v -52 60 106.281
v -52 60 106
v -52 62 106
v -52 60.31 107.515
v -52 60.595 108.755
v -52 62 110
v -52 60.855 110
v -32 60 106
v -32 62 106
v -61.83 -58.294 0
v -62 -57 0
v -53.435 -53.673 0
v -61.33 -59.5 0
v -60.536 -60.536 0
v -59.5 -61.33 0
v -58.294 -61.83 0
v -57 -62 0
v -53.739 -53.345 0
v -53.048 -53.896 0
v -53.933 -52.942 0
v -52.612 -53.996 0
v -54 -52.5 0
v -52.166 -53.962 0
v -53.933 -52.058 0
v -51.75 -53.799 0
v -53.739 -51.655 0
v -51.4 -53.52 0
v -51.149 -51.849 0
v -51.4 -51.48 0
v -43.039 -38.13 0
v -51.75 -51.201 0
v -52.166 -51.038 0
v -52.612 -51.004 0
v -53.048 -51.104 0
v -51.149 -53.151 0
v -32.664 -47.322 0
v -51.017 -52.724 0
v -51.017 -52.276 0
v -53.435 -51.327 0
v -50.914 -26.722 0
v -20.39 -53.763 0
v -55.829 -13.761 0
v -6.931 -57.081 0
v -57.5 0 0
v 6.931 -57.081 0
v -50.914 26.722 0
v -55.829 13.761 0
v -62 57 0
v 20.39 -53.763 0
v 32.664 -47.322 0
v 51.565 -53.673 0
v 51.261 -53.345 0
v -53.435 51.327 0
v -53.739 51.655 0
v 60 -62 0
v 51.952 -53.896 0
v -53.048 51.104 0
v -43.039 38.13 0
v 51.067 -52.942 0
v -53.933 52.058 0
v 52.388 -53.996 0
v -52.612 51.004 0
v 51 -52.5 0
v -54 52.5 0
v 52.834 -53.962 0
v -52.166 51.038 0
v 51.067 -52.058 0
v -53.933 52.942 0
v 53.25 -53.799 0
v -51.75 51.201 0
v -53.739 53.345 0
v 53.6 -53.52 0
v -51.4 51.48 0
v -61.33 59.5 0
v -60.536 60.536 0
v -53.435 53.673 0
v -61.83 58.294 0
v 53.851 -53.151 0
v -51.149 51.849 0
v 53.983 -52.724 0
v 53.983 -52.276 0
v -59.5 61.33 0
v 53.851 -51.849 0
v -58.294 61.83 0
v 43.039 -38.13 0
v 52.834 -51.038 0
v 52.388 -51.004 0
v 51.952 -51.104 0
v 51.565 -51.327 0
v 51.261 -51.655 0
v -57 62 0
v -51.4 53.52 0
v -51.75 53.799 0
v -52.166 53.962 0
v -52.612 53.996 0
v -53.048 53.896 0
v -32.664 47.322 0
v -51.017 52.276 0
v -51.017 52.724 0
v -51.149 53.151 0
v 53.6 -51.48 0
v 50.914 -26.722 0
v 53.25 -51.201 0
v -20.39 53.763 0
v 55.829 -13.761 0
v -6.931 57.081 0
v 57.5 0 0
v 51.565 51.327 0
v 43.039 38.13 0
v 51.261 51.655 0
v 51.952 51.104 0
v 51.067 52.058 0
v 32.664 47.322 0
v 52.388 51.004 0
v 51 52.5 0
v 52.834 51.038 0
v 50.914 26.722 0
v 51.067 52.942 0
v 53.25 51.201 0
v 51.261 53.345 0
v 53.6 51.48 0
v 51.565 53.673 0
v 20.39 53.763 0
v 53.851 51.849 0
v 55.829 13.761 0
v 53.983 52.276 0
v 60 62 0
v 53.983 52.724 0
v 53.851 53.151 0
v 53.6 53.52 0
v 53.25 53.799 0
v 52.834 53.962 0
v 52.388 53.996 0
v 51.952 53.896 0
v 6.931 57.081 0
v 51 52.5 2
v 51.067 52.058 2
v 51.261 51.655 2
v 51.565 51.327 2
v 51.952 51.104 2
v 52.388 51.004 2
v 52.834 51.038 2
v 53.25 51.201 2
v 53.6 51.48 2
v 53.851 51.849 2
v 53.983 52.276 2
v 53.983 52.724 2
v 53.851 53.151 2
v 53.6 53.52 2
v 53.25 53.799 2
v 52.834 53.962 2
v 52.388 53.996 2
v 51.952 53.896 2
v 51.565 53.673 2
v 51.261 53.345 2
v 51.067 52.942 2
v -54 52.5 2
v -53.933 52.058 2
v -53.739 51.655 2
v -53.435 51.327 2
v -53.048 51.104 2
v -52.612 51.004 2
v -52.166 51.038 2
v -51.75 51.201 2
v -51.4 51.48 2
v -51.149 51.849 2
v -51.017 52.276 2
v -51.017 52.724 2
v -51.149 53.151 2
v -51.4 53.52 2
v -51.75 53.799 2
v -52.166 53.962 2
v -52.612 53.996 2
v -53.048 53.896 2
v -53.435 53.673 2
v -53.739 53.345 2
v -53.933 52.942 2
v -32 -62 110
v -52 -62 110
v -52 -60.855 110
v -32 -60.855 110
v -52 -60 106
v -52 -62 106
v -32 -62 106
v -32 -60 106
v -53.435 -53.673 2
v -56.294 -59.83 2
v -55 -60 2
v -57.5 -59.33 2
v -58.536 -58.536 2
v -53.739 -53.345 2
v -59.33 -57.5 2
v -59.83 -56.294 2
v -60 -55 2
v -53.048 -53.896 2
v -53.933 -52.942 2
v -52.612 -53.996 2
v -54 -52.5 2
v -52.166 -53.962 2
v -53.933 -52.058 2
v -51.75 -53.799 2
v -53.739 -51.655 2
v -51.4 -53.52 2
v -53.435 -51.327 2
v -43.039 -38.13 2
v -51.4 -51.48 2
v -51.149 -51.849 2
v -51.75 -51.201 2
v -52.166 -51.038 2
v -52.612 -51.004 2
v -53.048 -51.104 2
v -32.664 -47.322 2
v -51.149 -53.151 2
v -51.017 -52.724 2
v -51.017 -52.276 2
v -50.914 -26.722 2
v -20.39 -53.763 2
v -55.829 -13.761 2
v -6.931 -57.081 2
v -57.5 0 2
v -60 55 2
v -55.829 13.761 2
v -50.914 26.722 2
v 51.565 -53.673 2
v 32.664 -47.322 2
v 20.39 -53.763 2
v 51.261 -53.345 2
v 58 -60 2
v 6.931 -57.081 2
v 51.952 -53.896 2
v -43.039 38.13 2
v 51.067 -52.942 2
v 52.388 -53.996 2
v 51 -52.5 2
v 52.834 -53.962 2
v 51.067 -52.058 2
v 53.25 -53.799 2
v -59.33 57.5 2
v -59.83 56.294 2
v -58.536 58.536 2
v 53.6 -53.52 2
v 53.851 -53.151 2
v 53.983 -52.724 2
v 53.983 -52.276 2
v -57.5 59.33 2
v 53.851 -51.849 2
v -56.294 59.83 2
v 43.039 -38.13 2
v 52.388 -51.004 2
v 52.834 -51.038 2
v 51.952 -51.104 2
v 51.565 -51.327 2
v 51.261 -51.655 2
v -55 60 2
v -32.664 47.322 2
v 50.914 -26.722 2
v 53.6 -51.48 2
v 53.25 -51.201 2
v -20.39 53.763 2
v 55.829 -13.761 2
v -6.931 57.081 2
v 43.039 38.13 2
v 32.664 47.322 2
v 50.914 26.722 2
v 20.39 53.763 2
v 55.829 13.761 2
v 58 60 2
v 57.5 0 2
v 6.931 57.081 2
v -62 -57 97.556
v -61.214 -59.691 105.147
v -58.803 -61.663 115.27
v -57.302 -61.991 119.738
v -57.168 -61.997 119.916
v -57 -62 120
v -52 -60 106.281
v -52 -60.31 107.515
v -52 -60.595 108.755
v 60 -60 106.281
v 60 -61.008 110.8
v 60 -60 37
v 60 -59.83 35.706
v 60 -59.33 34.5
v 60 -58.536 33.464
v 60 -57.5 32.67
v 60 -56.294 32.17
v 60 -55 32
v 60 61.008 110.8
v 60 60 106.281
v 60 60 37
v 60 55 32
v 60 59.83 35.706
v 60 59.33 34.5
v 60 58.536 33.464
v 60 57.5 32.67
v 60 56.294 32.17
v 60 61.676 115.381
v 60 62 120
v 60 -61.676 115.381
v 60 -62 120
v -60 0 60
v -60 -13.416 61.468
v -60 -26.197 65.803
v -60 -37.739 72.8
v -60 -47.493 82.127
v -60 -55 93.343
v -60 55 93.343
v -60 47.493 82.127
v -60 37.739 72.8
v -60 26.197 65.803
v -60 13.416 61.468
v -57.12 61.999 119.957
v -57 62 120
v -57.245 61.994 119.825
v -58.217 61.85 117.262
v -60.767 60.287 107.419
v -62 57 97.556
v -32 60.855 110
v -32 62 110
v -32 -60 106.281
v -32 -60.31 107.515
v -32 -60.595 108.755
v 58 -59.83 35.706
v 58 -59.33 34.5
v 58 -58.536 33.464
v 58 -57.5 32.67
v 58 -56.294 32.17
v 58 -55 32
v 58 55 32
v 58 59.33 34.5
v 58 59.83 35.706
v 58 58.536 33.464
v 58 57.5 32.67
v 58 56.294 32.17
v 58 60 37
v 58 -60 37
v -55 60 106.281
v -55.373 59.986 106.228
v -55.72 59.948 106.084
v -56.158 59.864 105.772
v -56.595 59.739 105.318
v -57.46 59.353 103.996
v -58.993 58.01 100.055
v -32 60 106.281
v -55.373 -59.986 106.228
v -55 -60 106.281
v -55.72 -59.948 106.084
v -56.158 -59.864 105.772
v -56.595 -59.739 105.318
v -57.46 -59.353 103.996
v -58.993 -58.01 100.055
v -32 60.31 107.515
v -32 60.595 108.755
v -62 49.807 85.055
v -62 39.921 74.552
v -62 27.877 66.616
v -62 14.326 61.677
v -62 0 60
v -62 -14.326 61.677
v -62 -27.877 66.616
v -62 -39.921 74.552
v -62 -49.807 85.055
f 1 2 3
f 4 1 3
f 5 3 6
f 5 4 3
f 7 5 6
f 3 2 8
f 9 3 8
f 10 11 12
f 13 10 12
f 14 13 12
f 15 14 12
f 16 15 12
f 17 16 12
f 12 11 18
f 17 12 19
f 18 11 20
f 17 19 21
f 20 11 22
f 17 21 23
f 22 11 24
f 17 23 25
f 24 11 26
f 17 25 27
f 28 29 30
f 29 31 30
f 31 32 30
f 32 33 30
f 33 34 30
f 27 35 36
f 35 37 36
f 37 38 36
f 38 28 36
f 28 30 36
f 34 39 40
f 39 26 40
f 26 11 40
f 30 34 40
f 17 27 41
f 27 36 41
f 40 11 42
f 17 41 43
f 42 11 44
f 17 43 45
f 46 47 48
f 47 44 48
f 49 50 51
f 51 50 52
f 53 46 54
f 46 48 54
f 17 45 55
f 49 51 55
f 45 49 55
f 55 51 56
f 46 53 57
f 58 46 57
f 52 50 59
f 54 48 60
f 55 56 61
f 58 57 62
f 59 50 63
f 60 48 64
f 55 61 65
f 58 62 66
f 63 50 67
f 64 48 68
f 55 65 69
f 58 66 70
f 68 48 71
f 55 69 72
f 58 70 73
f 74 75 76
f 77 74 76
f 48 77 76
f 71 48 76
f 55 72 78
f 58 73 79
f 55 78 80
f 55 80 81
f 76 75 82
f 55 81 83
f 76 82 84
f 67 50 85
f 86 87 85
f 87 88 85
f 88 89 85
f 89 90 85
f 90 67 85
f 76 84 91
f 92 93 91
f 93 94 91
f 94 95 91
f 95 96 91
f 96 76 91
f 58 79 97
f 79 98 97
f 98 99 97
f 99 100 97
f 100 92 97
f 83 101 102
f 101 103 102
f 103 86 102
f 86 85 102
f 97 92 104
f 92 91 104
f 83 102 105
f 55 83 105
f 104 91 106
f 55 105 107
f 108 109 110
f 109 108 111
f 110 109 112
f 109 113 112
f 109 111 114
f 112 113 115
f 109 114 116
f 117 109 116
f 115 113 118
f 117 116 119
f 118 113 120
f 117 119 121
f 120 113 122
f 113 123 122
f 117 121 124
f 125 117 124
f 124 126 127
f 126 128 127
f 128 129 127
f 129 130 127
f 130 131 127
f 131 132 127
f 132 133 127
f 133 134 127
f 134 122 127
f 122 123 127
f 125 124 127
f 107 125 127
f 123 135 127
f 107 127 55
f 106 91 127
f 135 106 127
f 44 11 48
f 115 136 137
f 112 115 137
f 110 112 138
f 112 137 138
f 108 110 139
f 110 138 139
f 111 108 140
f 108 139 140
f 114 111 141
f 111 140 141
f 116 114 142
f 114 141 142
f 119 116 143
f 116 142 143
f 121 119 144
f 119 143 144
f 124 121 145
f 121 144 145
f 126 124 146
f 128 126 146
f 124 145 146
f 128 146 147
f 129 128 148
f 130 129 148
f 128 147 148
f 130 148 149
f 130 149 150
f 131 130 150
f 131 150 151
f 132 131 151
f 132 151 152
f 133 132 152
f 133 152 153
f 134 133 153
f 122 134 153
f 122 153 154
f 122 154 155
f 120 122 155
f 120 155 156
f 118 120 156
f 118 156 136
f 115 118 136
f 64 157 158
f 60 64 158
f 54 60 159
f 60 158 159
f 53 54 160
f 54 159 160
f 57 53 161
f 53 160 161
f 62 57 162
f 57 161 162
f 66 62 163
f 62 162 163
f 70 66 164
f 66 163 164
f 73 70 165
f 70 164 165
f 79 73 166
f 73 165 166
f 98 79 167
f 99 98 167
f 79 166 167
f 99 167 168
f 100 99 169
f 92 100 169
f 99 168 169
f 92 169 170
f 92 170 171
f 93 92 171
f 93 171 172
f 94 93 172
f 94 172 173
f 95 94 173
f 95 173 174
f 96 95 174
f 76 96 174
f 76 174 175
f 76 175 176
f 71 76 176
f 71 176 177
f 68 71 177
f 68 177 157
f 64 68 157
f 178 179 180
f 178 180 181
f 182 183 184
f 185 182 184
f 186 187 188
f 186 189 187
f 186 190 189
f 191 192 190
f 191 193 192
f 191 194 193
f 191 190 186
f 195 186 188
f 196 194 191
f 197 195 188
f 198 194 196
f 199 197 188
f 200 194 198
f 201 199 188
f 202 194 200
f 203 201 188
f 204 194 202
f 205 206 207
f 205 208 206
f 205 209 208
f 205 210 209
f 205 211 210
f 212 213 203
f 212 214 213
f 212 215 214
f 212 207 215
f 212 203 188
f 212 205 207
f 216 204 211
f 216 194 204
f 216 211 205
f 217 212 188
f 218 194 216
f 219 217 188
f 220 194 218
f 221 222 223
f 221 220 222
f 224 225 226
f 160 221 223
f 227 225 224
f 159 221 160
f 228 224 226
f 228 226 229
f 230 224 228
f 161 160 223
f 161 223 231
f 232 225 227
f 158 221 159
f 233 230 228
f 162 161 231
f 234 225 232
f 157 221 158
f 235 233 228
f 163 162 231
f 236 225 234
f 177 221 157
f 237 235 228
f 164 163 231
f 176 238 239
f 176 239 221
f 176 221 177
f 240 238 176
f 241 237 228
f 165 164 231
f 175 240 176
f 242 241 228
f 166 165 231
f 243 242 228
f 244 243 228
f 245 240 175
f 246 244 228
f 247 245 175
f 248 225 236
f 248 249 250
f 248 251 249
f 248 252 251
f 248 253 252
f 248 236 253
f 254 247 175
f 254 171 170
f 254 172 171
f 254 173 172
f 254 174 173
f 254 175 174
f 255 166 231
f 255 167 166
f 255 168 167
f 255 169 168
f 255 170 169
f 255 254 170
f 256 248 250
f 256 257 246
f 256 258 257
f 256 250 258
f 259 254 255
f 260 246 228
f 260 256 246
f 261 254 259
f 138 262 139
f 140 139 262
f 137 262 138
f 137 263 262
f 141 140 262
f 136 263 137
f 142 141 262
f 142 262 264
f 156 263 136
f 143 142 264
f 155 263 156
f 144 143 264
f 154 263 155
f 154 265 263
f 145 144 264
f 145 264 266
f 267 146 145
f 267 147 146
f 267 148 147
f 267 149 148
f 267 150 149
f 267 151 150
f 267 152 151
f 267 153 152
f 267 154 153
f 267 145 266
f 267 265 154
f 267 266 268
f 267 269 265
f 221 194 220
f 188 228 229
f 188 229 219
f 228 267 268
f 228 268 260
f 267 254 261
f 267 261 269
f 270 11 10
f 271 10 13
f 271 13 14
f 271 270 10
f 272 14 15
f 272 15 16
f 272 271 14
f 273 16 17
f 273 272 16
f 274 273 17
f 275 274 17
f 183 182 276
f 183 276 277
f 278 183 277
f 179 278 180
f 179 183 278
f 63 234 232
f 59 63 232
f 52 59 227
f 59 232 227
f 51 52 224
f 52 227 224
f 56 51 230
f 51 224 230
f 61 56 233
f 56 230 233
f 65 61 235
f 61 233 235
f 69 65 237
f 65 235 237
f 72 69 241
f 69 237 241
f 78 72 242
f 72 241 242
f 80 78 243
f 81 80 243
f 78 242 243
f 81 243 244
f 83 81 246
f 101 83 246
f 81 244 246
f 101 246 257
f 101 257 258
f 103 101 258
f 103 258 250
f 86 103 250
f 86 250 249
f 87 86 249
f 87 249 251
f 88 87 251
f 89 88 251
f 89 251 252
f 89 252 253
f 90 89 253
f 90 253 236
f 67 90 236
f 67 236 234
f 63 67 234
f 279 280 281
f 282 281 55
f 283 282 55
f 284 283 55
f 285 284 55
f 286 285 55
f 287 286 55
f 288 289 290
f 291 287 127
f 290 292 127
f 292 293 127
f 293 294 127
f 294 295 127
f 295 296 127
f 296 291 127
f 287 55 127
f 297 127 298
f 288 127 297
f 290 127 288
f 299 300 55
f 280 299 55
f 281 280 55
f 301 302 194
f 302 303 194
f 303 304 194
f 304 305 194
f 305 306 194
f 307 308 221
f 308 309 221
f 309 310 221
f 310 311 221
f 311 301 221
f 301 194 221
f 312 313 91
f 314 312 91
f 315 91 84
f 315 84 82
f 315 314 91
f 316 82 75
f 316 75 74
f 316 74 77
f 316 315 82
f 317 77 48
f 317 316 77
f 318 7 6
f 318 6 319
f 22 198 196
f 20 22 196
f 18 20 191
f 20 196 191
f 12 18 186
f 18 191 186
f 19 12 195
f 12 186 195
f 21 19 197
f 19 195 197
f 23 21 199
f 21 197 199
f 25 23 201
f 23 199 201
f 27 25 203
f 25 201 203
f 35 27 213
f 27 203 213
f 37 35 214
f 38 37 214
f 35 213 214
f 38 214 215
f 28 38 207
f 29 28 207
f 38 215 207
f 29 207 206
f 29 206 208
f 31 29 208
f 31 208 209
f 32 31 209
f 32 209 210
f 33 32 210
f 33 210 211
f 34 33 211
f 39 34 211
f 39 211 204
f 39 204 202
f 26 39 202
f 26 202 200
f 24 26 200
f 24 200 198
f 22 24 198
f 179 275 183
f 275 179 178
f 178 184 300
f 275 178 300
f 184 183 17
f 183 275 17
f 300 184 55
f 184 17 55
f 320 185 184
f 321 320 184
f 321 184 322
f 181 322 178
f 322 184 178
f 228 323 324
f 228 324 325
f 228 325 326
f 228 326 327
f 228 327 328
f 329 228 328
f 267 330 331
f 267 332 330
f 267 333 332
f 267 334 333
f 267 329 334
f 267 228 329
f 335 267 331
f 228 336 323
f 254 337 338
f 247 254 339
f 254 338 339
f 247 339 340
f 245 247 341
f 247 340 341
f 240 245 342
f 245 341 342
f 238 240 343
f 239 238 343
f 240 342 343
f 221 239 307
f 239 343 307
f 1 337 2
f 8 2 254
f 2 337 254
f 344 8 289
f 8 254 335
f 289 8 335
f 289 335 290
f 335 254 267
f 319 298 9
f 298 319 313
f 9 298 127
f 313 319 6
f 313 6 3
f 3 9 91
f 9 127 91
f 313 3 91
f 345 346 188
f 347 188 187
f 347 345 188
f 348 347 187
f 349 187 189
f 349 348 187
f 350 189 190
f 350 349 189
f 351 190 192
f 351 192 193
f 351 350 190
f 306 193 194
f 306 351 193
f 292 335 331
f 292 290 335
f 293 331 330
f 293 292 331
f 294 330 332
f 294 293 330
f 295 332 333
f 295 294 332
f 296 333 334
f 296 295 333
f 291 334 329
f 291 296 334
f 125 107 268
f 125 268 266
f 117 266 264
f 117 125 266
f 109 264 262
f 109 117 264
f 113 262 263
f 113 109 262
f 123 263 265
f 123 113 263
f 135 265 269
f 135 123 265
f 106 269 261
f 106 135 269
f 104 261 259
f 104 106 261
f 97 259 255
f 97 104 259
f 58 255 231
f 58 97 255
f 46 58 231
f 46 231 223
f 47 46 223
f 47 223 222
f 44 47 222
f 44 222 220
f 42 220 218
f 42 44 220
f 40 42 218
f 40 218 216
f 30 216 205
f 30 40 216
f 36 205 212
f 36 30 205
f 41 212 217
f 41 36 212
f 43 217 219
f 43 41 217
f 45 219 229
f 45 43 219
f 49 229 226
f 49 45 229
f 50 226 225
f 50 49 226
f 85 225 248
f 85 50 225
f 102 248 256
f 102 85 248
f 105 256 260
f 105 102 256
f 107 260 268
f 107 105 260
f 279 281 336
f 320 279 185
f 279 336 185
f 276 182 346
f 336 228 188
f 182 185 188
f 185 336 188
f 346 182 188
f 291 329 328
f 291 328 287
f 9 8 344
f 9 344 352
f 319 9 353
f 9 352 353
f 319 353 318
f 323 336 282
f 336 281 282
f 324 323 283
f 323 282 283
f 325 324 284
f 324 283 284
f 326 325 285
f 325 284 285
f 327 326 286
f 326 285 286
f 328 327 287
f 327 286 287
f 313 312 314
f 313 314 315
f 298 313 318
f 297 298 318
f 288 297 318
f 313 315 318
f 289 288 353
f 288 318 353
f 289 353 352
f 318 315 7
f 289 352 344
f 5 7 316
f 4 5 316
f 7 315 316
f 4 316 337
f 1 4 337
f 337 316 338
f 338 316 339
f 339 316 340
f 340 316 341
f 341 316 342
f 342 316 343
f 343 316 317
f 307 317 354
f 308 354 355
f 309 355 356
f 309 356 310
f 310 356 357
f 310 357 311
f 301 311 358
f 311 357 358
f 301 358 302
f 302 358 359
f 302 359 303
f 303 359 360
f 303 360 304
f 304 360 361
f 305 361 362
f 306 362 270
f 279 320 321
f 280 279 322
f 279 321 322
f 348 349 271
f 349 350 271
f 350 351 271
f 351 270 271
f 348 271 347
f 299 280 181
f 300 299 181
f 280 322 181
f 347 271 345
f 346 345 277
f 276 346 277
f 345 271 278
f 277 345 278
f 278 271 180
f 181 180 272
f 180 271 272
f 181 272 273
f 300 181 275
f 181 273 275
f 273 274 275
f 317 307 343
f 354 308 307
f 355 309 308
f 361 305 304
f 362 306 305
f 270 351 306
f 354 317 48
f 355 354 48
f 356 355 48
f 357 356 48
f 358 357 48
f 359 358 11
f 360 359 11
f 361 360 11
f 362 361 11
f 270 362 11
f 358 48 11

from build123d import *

# Parameters (mm, degrees)
F0_W     = 120
F0_H     = 120
F0_R     = 57.5
F1_DEPTH = 2
F2_DEPTH = 120
F3_D     = 3
F5_DEPTH = 122.001
F6_W     = 20
F6_H     = 4
F7_DEPTH = 124.001
F8_W     = 2
F8_H     = 120
F9_DEPTH = 30
F10_R    = 5


with BuildPart() as f1:
    # F0 (on Top) → F1 (new body)
    with BuildSketch(Plane.XY):
        Rectangle(F0_W, F0_H)
        Circle(F0_R, mode=Mode.SUBTRACT)
    extrude(amount=F1_DEPTH)

    # F0 (on Top) → F2 (join)
    with BuildSketch(Plane.XY):
        Polygon((60, -62), (60, -60), (-60, -60), (-60, 60), (60, 60), (60, 62), (-62, 62), (-62, -62), align=None)
    extrude(amount=F2_DEPTH)

    # F3 (through all)
    with Locations(Plane(origin=(0, 0, 0), x_dir=(1, 0, 0), z_dir=(0, 0, -1))):
        with Locations((52.5, 52.5), (52.5, -52.5), (-52.5, -52.5), (-52.5, 52.5)):
            Hole(F3_D / 2)

    # F4 (on face) → F5 (cut, through all)
    with BuildSketch(Plane(origin=(-62, 0, 0), x_dir=(0, -1, 0), z_dir=(-1, 0, 0))):
        with BuildLine():
            Line((62, 120), (-62, 120))
            ThreePointArc((-62, 120), (0, 60), (62, 120))
        make_face()
    extrude(amount=-F5_DEPTH, mode=Mode.SUBTRACT)

    # F6 (on face) → F7 (cut, through all)
    with BuildSketch(Plane.XZ.offset(62)):
        with Locations((-42, 108)):
            Rectangle(F6_W, F6_H)
    extrude(amount=-F7_DEPTH, mode=Mode.SUBTRACT)

    # F8 (on face) → F9 (join)
    with BuildSketch(Plane.XY.offset(2)):
        with Locations((59, 0)):
            Rectangle(F8_W, F8_H)
    extrude(amount=F9_DEPTH)

    # F10
    f10_edges = [f1.edges().sort_by_distance(p)[0] for p in [
        (59, 60, 32),
        (59, -60, 32),
        (-60, -60, 54.140525),
        (-62, -62, 60),
        (-62, 62, 60),
        (-60, 60, 54.140525),
    ]]
    fillet(f10_edges, radius=F10_R)


solid = f1.part
